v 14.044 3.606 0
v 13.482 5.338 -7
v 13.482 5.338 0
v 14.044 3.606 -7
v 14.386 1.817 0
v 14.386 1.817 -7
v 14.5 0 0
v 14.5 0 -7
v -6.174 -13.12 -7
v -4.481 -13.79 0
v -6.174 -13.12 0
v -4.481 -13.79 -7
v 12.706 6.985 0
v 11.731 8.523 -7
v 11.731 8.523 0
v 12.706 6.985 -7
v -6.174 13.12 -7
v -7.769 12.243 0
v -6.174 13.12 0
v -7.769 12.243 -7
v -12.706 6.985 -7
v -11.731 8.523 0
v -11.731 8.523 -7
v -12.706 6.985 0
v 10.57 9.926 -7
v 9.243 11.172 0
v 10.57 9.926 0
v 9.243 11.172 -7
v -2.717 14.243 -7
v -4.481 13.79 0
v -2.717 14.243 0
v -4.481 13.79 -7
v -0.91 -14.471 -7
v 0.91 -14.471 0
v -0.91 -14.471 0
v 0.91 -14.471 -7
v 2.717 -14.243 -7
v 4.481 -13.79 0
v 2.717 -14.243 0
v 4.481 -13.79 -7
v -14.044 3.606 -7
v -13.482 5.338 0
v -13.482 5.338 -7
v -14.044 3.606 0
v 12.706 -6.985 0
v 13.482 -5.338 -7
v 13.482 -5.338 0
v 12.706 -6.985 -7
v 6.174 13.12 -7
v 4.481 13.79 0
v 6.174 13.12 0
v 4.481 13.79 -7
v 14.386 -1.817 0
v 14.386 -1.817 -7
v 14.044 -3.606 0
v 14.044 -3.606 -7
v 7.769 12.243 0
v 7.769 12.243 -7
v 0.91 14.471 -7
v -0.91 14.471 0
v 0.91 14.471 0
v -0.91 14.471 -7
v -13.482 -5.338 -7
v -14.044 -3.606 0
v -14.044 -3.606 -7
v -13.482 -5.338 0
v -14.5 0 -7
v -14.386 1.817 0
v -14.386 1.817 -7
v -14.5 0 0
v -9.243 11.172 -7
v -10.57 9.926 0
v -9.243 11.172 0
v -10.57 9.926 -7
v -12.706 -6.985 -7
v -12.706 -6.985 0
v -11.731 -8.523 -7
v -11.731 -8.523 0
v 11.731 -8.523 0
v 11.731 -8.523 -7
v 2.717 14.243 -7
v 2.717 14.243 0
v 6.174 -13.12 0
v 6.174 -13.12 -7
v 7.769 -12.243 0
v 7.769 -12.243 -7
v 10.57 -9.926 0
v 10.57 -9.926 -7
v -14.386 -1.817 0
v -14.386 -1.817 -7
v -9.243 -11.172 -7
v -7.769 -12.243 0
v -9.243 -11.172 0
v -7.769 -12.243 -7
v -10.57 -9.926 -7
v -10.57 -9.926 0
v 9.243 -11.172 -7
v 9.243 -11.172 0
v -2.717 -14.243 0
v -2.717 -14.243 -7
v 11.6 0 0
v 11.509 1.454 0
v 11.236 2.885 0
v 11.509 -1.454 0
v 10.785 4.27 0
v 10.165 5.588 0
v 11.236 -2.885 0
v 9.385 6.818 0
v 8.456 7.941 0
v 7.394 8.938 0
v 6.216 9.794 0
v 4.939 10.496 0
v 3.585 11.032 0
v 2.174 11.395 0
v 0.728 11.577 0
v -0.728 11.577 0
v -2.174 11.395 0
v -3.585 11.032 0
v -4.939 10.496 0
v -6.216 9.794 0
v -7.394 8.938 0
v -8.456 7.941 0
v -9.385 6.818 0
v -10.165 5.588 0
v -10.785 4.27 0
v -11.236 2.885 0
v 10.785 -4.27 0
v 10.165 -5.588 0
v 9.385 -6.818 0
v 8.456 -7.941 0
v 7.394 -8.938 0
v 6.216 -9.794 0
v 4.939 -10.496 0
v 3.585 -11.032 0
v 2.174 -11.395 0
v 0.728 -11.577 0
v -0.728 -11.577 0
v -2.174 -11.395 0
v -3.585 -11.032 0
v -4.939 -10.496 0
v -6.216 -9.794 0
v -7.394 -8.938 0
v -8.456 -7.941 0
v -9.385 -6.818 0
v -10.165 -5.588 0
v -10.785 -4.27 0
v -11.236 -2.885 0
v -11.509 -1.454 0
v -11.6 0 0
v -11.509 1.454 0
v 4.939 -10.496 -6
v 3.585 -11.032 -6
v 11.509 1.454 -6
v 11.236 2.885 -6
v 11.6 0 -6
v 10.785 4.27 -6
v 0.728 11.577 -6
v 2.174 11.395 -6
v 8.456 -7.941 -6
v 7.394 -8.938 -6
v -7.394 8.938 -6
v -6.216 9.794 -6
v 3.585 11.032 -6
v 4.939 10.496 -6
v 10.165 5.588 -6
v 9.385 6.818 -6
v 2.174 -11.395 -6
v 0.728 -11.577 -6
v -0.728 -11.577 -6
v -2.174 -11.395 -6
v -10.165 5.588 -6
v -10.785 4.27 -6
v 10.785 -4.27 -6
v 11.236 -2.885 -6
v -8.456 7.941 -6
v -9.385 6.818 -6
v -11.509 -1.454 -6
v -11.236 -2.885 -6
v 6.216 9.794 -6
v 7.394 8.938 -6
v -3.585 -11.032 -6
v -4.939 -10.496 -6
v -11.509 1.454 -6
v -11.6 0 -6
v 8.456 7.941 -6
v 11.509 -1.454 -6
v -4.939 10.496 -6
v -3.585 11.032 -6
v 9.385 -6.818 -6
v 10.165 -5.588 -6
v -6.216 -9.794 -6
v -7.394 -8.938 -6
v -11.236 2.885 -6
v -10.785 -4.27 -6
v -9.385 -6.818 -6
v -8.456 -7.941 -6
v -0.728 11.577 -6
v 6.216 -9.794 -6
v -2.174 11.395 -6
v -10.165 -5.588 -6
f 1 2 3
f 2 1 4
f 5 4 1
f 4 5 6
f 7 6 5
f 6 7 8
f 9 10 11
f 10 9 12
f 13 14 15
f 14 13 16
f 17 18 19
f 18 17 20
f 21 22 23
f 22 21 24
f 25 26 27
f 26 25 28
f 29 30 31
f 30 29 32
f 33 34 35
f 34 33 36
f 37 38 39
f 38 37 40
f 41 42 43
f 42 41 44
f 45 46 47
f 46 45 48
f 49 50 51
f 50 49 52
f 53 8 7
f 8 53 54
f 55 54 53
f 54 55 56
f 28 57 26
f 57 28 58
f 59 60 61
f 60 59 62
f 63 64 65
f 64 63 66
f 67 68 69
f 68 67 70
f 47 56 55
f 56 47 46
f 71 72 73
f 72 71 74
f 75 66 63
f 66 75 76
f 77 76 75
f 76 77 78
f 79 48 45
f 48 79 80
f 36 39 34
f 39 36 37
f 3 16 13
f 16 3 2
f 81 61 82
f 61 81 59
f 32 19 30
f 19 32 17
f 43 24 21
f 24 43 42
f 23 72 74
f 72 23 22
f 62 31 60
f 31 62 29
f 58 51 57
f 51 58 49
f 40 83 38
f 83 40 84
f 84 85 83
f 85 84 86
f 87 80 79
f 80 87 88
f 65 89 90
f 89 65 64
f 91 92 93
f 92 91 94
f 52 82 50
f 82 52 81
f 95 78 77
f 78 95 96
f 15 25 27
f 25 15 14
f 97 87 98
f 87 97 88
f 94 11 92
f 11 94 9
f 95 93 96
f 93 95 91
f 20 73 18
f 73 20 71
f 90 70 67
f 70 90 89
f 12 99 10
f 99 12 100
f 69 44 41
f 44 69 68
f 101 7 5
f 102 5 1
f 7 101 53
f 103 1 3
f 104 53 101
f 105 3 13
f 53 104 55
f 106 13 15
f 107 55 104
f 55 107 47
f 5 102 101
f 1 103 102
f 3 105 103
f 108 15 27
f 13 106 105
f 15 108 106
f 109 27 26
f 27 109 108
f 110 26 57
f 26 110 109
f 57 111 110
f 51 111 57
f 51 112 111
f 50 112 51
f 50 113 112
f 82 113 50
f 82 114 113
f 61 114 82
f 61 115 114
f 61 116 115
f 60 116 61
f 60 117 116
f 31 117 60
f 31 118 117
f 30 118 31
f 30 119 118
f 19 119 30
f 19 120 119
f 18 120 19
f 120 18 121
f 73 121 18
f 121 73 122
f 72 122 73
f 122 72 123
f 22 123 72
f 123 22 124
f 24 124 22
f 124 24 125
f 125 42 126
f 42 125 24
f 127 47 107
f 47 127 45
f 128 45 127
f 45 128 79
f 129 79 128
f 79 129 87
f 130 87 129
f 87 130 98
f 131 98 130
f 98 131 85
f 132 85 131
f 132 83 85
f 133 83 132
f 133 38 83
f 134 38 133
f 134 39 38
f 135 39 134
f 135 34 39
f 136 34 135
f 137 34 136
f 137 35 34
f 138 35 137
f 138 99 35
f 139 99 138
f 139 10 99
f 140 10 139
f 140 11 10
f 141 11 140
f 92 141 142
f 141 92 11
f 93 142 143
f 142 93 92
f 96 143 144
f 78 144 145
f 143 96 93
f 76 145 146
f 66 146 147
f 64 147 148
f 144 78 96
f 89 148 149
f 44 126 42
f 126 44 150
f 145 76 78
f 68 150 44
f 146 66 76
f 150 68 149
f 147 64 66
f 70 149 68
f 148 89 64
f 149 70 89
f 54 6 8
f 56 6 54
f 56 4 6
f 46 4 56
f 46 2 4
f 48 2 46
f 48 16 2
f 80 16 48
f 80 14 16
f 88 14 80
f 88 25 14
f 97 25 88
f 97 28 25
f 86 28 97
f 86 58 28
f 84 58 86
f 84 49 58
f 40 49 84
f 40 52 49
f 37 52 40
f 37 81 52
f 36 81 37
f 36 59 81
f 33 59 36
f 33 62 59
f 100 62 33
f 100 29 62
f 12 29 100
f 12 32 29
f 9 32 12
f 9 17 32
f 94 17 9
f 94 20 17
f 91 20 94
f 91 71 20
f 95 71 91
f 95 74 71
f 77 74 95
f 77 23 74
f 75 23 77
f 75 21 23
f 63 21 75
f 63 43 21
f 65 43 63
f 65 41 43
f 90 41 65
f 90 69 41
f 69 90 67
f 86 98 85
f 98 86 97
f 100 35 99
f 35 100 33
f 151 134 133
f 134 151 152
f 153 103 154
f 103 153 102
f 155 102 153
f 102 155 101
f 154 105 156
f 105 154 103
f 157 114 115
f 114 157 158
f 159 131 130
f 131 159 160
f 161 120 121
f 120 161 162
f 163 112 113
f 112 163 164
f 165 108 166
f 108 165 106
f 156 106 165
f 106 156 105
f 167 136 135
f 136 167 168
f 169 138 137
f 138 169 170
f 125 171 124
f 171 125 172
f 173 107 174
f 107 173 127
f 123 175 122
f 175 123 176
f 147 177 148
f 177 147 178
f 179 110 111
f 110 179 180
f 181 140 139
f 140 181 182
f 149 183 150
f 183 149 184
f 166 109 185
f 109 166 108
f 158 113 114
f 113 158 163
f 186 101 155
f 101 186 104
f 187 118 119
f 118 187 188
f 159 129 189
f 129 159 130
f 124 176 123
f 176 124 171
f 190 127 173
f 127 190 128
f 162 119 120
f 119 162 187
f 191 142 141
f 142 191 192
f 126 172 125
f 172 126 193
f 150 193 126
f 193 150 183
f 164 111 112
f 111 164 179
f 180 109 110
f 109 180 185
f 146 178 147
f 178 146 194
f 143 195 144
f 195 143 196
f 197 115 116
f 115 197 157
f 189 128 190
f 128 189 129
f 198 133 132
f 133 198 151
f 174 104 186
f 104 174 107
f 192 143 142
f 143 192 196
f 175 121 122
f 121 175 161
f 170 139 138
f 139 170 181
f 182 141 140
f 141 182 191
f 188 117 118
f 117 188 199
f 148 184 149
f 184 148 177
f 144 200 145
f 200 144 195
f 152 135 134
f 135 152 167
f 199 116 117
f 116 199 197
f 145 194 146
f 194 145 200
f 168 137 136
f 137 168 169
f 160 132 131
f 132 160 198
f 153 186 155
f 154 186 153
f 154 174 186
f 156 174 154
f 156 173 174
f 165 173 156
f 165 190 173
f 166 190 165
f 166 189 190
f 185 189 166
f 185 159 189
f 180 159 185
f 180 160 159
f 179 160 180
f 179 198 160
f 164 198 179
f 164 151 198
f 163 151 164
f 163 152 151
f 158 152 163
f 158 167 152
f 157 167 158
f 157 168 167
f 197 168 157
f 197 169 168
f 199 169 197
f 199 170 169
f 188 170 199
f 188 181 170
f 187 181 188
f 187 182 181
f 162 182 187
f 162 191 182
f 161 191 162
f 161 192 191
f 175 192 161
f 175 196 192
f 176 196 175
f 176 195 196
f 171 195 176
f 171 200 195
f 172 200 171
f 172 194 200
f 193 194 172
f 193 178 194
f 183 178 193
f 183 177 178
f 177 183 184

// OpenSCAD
$fn = 50;


difference() {
	union() {
		translate(v = [0, 0, -7.0000000000]) {
			cylinder(h = 7, r = 14.5000000000);
		}
	}
	union() {
		#translate(v = [0, 0, -6.0000000000]) {
			cylinder(h = 6, r = 11.6000000000);
		}
	}
}
